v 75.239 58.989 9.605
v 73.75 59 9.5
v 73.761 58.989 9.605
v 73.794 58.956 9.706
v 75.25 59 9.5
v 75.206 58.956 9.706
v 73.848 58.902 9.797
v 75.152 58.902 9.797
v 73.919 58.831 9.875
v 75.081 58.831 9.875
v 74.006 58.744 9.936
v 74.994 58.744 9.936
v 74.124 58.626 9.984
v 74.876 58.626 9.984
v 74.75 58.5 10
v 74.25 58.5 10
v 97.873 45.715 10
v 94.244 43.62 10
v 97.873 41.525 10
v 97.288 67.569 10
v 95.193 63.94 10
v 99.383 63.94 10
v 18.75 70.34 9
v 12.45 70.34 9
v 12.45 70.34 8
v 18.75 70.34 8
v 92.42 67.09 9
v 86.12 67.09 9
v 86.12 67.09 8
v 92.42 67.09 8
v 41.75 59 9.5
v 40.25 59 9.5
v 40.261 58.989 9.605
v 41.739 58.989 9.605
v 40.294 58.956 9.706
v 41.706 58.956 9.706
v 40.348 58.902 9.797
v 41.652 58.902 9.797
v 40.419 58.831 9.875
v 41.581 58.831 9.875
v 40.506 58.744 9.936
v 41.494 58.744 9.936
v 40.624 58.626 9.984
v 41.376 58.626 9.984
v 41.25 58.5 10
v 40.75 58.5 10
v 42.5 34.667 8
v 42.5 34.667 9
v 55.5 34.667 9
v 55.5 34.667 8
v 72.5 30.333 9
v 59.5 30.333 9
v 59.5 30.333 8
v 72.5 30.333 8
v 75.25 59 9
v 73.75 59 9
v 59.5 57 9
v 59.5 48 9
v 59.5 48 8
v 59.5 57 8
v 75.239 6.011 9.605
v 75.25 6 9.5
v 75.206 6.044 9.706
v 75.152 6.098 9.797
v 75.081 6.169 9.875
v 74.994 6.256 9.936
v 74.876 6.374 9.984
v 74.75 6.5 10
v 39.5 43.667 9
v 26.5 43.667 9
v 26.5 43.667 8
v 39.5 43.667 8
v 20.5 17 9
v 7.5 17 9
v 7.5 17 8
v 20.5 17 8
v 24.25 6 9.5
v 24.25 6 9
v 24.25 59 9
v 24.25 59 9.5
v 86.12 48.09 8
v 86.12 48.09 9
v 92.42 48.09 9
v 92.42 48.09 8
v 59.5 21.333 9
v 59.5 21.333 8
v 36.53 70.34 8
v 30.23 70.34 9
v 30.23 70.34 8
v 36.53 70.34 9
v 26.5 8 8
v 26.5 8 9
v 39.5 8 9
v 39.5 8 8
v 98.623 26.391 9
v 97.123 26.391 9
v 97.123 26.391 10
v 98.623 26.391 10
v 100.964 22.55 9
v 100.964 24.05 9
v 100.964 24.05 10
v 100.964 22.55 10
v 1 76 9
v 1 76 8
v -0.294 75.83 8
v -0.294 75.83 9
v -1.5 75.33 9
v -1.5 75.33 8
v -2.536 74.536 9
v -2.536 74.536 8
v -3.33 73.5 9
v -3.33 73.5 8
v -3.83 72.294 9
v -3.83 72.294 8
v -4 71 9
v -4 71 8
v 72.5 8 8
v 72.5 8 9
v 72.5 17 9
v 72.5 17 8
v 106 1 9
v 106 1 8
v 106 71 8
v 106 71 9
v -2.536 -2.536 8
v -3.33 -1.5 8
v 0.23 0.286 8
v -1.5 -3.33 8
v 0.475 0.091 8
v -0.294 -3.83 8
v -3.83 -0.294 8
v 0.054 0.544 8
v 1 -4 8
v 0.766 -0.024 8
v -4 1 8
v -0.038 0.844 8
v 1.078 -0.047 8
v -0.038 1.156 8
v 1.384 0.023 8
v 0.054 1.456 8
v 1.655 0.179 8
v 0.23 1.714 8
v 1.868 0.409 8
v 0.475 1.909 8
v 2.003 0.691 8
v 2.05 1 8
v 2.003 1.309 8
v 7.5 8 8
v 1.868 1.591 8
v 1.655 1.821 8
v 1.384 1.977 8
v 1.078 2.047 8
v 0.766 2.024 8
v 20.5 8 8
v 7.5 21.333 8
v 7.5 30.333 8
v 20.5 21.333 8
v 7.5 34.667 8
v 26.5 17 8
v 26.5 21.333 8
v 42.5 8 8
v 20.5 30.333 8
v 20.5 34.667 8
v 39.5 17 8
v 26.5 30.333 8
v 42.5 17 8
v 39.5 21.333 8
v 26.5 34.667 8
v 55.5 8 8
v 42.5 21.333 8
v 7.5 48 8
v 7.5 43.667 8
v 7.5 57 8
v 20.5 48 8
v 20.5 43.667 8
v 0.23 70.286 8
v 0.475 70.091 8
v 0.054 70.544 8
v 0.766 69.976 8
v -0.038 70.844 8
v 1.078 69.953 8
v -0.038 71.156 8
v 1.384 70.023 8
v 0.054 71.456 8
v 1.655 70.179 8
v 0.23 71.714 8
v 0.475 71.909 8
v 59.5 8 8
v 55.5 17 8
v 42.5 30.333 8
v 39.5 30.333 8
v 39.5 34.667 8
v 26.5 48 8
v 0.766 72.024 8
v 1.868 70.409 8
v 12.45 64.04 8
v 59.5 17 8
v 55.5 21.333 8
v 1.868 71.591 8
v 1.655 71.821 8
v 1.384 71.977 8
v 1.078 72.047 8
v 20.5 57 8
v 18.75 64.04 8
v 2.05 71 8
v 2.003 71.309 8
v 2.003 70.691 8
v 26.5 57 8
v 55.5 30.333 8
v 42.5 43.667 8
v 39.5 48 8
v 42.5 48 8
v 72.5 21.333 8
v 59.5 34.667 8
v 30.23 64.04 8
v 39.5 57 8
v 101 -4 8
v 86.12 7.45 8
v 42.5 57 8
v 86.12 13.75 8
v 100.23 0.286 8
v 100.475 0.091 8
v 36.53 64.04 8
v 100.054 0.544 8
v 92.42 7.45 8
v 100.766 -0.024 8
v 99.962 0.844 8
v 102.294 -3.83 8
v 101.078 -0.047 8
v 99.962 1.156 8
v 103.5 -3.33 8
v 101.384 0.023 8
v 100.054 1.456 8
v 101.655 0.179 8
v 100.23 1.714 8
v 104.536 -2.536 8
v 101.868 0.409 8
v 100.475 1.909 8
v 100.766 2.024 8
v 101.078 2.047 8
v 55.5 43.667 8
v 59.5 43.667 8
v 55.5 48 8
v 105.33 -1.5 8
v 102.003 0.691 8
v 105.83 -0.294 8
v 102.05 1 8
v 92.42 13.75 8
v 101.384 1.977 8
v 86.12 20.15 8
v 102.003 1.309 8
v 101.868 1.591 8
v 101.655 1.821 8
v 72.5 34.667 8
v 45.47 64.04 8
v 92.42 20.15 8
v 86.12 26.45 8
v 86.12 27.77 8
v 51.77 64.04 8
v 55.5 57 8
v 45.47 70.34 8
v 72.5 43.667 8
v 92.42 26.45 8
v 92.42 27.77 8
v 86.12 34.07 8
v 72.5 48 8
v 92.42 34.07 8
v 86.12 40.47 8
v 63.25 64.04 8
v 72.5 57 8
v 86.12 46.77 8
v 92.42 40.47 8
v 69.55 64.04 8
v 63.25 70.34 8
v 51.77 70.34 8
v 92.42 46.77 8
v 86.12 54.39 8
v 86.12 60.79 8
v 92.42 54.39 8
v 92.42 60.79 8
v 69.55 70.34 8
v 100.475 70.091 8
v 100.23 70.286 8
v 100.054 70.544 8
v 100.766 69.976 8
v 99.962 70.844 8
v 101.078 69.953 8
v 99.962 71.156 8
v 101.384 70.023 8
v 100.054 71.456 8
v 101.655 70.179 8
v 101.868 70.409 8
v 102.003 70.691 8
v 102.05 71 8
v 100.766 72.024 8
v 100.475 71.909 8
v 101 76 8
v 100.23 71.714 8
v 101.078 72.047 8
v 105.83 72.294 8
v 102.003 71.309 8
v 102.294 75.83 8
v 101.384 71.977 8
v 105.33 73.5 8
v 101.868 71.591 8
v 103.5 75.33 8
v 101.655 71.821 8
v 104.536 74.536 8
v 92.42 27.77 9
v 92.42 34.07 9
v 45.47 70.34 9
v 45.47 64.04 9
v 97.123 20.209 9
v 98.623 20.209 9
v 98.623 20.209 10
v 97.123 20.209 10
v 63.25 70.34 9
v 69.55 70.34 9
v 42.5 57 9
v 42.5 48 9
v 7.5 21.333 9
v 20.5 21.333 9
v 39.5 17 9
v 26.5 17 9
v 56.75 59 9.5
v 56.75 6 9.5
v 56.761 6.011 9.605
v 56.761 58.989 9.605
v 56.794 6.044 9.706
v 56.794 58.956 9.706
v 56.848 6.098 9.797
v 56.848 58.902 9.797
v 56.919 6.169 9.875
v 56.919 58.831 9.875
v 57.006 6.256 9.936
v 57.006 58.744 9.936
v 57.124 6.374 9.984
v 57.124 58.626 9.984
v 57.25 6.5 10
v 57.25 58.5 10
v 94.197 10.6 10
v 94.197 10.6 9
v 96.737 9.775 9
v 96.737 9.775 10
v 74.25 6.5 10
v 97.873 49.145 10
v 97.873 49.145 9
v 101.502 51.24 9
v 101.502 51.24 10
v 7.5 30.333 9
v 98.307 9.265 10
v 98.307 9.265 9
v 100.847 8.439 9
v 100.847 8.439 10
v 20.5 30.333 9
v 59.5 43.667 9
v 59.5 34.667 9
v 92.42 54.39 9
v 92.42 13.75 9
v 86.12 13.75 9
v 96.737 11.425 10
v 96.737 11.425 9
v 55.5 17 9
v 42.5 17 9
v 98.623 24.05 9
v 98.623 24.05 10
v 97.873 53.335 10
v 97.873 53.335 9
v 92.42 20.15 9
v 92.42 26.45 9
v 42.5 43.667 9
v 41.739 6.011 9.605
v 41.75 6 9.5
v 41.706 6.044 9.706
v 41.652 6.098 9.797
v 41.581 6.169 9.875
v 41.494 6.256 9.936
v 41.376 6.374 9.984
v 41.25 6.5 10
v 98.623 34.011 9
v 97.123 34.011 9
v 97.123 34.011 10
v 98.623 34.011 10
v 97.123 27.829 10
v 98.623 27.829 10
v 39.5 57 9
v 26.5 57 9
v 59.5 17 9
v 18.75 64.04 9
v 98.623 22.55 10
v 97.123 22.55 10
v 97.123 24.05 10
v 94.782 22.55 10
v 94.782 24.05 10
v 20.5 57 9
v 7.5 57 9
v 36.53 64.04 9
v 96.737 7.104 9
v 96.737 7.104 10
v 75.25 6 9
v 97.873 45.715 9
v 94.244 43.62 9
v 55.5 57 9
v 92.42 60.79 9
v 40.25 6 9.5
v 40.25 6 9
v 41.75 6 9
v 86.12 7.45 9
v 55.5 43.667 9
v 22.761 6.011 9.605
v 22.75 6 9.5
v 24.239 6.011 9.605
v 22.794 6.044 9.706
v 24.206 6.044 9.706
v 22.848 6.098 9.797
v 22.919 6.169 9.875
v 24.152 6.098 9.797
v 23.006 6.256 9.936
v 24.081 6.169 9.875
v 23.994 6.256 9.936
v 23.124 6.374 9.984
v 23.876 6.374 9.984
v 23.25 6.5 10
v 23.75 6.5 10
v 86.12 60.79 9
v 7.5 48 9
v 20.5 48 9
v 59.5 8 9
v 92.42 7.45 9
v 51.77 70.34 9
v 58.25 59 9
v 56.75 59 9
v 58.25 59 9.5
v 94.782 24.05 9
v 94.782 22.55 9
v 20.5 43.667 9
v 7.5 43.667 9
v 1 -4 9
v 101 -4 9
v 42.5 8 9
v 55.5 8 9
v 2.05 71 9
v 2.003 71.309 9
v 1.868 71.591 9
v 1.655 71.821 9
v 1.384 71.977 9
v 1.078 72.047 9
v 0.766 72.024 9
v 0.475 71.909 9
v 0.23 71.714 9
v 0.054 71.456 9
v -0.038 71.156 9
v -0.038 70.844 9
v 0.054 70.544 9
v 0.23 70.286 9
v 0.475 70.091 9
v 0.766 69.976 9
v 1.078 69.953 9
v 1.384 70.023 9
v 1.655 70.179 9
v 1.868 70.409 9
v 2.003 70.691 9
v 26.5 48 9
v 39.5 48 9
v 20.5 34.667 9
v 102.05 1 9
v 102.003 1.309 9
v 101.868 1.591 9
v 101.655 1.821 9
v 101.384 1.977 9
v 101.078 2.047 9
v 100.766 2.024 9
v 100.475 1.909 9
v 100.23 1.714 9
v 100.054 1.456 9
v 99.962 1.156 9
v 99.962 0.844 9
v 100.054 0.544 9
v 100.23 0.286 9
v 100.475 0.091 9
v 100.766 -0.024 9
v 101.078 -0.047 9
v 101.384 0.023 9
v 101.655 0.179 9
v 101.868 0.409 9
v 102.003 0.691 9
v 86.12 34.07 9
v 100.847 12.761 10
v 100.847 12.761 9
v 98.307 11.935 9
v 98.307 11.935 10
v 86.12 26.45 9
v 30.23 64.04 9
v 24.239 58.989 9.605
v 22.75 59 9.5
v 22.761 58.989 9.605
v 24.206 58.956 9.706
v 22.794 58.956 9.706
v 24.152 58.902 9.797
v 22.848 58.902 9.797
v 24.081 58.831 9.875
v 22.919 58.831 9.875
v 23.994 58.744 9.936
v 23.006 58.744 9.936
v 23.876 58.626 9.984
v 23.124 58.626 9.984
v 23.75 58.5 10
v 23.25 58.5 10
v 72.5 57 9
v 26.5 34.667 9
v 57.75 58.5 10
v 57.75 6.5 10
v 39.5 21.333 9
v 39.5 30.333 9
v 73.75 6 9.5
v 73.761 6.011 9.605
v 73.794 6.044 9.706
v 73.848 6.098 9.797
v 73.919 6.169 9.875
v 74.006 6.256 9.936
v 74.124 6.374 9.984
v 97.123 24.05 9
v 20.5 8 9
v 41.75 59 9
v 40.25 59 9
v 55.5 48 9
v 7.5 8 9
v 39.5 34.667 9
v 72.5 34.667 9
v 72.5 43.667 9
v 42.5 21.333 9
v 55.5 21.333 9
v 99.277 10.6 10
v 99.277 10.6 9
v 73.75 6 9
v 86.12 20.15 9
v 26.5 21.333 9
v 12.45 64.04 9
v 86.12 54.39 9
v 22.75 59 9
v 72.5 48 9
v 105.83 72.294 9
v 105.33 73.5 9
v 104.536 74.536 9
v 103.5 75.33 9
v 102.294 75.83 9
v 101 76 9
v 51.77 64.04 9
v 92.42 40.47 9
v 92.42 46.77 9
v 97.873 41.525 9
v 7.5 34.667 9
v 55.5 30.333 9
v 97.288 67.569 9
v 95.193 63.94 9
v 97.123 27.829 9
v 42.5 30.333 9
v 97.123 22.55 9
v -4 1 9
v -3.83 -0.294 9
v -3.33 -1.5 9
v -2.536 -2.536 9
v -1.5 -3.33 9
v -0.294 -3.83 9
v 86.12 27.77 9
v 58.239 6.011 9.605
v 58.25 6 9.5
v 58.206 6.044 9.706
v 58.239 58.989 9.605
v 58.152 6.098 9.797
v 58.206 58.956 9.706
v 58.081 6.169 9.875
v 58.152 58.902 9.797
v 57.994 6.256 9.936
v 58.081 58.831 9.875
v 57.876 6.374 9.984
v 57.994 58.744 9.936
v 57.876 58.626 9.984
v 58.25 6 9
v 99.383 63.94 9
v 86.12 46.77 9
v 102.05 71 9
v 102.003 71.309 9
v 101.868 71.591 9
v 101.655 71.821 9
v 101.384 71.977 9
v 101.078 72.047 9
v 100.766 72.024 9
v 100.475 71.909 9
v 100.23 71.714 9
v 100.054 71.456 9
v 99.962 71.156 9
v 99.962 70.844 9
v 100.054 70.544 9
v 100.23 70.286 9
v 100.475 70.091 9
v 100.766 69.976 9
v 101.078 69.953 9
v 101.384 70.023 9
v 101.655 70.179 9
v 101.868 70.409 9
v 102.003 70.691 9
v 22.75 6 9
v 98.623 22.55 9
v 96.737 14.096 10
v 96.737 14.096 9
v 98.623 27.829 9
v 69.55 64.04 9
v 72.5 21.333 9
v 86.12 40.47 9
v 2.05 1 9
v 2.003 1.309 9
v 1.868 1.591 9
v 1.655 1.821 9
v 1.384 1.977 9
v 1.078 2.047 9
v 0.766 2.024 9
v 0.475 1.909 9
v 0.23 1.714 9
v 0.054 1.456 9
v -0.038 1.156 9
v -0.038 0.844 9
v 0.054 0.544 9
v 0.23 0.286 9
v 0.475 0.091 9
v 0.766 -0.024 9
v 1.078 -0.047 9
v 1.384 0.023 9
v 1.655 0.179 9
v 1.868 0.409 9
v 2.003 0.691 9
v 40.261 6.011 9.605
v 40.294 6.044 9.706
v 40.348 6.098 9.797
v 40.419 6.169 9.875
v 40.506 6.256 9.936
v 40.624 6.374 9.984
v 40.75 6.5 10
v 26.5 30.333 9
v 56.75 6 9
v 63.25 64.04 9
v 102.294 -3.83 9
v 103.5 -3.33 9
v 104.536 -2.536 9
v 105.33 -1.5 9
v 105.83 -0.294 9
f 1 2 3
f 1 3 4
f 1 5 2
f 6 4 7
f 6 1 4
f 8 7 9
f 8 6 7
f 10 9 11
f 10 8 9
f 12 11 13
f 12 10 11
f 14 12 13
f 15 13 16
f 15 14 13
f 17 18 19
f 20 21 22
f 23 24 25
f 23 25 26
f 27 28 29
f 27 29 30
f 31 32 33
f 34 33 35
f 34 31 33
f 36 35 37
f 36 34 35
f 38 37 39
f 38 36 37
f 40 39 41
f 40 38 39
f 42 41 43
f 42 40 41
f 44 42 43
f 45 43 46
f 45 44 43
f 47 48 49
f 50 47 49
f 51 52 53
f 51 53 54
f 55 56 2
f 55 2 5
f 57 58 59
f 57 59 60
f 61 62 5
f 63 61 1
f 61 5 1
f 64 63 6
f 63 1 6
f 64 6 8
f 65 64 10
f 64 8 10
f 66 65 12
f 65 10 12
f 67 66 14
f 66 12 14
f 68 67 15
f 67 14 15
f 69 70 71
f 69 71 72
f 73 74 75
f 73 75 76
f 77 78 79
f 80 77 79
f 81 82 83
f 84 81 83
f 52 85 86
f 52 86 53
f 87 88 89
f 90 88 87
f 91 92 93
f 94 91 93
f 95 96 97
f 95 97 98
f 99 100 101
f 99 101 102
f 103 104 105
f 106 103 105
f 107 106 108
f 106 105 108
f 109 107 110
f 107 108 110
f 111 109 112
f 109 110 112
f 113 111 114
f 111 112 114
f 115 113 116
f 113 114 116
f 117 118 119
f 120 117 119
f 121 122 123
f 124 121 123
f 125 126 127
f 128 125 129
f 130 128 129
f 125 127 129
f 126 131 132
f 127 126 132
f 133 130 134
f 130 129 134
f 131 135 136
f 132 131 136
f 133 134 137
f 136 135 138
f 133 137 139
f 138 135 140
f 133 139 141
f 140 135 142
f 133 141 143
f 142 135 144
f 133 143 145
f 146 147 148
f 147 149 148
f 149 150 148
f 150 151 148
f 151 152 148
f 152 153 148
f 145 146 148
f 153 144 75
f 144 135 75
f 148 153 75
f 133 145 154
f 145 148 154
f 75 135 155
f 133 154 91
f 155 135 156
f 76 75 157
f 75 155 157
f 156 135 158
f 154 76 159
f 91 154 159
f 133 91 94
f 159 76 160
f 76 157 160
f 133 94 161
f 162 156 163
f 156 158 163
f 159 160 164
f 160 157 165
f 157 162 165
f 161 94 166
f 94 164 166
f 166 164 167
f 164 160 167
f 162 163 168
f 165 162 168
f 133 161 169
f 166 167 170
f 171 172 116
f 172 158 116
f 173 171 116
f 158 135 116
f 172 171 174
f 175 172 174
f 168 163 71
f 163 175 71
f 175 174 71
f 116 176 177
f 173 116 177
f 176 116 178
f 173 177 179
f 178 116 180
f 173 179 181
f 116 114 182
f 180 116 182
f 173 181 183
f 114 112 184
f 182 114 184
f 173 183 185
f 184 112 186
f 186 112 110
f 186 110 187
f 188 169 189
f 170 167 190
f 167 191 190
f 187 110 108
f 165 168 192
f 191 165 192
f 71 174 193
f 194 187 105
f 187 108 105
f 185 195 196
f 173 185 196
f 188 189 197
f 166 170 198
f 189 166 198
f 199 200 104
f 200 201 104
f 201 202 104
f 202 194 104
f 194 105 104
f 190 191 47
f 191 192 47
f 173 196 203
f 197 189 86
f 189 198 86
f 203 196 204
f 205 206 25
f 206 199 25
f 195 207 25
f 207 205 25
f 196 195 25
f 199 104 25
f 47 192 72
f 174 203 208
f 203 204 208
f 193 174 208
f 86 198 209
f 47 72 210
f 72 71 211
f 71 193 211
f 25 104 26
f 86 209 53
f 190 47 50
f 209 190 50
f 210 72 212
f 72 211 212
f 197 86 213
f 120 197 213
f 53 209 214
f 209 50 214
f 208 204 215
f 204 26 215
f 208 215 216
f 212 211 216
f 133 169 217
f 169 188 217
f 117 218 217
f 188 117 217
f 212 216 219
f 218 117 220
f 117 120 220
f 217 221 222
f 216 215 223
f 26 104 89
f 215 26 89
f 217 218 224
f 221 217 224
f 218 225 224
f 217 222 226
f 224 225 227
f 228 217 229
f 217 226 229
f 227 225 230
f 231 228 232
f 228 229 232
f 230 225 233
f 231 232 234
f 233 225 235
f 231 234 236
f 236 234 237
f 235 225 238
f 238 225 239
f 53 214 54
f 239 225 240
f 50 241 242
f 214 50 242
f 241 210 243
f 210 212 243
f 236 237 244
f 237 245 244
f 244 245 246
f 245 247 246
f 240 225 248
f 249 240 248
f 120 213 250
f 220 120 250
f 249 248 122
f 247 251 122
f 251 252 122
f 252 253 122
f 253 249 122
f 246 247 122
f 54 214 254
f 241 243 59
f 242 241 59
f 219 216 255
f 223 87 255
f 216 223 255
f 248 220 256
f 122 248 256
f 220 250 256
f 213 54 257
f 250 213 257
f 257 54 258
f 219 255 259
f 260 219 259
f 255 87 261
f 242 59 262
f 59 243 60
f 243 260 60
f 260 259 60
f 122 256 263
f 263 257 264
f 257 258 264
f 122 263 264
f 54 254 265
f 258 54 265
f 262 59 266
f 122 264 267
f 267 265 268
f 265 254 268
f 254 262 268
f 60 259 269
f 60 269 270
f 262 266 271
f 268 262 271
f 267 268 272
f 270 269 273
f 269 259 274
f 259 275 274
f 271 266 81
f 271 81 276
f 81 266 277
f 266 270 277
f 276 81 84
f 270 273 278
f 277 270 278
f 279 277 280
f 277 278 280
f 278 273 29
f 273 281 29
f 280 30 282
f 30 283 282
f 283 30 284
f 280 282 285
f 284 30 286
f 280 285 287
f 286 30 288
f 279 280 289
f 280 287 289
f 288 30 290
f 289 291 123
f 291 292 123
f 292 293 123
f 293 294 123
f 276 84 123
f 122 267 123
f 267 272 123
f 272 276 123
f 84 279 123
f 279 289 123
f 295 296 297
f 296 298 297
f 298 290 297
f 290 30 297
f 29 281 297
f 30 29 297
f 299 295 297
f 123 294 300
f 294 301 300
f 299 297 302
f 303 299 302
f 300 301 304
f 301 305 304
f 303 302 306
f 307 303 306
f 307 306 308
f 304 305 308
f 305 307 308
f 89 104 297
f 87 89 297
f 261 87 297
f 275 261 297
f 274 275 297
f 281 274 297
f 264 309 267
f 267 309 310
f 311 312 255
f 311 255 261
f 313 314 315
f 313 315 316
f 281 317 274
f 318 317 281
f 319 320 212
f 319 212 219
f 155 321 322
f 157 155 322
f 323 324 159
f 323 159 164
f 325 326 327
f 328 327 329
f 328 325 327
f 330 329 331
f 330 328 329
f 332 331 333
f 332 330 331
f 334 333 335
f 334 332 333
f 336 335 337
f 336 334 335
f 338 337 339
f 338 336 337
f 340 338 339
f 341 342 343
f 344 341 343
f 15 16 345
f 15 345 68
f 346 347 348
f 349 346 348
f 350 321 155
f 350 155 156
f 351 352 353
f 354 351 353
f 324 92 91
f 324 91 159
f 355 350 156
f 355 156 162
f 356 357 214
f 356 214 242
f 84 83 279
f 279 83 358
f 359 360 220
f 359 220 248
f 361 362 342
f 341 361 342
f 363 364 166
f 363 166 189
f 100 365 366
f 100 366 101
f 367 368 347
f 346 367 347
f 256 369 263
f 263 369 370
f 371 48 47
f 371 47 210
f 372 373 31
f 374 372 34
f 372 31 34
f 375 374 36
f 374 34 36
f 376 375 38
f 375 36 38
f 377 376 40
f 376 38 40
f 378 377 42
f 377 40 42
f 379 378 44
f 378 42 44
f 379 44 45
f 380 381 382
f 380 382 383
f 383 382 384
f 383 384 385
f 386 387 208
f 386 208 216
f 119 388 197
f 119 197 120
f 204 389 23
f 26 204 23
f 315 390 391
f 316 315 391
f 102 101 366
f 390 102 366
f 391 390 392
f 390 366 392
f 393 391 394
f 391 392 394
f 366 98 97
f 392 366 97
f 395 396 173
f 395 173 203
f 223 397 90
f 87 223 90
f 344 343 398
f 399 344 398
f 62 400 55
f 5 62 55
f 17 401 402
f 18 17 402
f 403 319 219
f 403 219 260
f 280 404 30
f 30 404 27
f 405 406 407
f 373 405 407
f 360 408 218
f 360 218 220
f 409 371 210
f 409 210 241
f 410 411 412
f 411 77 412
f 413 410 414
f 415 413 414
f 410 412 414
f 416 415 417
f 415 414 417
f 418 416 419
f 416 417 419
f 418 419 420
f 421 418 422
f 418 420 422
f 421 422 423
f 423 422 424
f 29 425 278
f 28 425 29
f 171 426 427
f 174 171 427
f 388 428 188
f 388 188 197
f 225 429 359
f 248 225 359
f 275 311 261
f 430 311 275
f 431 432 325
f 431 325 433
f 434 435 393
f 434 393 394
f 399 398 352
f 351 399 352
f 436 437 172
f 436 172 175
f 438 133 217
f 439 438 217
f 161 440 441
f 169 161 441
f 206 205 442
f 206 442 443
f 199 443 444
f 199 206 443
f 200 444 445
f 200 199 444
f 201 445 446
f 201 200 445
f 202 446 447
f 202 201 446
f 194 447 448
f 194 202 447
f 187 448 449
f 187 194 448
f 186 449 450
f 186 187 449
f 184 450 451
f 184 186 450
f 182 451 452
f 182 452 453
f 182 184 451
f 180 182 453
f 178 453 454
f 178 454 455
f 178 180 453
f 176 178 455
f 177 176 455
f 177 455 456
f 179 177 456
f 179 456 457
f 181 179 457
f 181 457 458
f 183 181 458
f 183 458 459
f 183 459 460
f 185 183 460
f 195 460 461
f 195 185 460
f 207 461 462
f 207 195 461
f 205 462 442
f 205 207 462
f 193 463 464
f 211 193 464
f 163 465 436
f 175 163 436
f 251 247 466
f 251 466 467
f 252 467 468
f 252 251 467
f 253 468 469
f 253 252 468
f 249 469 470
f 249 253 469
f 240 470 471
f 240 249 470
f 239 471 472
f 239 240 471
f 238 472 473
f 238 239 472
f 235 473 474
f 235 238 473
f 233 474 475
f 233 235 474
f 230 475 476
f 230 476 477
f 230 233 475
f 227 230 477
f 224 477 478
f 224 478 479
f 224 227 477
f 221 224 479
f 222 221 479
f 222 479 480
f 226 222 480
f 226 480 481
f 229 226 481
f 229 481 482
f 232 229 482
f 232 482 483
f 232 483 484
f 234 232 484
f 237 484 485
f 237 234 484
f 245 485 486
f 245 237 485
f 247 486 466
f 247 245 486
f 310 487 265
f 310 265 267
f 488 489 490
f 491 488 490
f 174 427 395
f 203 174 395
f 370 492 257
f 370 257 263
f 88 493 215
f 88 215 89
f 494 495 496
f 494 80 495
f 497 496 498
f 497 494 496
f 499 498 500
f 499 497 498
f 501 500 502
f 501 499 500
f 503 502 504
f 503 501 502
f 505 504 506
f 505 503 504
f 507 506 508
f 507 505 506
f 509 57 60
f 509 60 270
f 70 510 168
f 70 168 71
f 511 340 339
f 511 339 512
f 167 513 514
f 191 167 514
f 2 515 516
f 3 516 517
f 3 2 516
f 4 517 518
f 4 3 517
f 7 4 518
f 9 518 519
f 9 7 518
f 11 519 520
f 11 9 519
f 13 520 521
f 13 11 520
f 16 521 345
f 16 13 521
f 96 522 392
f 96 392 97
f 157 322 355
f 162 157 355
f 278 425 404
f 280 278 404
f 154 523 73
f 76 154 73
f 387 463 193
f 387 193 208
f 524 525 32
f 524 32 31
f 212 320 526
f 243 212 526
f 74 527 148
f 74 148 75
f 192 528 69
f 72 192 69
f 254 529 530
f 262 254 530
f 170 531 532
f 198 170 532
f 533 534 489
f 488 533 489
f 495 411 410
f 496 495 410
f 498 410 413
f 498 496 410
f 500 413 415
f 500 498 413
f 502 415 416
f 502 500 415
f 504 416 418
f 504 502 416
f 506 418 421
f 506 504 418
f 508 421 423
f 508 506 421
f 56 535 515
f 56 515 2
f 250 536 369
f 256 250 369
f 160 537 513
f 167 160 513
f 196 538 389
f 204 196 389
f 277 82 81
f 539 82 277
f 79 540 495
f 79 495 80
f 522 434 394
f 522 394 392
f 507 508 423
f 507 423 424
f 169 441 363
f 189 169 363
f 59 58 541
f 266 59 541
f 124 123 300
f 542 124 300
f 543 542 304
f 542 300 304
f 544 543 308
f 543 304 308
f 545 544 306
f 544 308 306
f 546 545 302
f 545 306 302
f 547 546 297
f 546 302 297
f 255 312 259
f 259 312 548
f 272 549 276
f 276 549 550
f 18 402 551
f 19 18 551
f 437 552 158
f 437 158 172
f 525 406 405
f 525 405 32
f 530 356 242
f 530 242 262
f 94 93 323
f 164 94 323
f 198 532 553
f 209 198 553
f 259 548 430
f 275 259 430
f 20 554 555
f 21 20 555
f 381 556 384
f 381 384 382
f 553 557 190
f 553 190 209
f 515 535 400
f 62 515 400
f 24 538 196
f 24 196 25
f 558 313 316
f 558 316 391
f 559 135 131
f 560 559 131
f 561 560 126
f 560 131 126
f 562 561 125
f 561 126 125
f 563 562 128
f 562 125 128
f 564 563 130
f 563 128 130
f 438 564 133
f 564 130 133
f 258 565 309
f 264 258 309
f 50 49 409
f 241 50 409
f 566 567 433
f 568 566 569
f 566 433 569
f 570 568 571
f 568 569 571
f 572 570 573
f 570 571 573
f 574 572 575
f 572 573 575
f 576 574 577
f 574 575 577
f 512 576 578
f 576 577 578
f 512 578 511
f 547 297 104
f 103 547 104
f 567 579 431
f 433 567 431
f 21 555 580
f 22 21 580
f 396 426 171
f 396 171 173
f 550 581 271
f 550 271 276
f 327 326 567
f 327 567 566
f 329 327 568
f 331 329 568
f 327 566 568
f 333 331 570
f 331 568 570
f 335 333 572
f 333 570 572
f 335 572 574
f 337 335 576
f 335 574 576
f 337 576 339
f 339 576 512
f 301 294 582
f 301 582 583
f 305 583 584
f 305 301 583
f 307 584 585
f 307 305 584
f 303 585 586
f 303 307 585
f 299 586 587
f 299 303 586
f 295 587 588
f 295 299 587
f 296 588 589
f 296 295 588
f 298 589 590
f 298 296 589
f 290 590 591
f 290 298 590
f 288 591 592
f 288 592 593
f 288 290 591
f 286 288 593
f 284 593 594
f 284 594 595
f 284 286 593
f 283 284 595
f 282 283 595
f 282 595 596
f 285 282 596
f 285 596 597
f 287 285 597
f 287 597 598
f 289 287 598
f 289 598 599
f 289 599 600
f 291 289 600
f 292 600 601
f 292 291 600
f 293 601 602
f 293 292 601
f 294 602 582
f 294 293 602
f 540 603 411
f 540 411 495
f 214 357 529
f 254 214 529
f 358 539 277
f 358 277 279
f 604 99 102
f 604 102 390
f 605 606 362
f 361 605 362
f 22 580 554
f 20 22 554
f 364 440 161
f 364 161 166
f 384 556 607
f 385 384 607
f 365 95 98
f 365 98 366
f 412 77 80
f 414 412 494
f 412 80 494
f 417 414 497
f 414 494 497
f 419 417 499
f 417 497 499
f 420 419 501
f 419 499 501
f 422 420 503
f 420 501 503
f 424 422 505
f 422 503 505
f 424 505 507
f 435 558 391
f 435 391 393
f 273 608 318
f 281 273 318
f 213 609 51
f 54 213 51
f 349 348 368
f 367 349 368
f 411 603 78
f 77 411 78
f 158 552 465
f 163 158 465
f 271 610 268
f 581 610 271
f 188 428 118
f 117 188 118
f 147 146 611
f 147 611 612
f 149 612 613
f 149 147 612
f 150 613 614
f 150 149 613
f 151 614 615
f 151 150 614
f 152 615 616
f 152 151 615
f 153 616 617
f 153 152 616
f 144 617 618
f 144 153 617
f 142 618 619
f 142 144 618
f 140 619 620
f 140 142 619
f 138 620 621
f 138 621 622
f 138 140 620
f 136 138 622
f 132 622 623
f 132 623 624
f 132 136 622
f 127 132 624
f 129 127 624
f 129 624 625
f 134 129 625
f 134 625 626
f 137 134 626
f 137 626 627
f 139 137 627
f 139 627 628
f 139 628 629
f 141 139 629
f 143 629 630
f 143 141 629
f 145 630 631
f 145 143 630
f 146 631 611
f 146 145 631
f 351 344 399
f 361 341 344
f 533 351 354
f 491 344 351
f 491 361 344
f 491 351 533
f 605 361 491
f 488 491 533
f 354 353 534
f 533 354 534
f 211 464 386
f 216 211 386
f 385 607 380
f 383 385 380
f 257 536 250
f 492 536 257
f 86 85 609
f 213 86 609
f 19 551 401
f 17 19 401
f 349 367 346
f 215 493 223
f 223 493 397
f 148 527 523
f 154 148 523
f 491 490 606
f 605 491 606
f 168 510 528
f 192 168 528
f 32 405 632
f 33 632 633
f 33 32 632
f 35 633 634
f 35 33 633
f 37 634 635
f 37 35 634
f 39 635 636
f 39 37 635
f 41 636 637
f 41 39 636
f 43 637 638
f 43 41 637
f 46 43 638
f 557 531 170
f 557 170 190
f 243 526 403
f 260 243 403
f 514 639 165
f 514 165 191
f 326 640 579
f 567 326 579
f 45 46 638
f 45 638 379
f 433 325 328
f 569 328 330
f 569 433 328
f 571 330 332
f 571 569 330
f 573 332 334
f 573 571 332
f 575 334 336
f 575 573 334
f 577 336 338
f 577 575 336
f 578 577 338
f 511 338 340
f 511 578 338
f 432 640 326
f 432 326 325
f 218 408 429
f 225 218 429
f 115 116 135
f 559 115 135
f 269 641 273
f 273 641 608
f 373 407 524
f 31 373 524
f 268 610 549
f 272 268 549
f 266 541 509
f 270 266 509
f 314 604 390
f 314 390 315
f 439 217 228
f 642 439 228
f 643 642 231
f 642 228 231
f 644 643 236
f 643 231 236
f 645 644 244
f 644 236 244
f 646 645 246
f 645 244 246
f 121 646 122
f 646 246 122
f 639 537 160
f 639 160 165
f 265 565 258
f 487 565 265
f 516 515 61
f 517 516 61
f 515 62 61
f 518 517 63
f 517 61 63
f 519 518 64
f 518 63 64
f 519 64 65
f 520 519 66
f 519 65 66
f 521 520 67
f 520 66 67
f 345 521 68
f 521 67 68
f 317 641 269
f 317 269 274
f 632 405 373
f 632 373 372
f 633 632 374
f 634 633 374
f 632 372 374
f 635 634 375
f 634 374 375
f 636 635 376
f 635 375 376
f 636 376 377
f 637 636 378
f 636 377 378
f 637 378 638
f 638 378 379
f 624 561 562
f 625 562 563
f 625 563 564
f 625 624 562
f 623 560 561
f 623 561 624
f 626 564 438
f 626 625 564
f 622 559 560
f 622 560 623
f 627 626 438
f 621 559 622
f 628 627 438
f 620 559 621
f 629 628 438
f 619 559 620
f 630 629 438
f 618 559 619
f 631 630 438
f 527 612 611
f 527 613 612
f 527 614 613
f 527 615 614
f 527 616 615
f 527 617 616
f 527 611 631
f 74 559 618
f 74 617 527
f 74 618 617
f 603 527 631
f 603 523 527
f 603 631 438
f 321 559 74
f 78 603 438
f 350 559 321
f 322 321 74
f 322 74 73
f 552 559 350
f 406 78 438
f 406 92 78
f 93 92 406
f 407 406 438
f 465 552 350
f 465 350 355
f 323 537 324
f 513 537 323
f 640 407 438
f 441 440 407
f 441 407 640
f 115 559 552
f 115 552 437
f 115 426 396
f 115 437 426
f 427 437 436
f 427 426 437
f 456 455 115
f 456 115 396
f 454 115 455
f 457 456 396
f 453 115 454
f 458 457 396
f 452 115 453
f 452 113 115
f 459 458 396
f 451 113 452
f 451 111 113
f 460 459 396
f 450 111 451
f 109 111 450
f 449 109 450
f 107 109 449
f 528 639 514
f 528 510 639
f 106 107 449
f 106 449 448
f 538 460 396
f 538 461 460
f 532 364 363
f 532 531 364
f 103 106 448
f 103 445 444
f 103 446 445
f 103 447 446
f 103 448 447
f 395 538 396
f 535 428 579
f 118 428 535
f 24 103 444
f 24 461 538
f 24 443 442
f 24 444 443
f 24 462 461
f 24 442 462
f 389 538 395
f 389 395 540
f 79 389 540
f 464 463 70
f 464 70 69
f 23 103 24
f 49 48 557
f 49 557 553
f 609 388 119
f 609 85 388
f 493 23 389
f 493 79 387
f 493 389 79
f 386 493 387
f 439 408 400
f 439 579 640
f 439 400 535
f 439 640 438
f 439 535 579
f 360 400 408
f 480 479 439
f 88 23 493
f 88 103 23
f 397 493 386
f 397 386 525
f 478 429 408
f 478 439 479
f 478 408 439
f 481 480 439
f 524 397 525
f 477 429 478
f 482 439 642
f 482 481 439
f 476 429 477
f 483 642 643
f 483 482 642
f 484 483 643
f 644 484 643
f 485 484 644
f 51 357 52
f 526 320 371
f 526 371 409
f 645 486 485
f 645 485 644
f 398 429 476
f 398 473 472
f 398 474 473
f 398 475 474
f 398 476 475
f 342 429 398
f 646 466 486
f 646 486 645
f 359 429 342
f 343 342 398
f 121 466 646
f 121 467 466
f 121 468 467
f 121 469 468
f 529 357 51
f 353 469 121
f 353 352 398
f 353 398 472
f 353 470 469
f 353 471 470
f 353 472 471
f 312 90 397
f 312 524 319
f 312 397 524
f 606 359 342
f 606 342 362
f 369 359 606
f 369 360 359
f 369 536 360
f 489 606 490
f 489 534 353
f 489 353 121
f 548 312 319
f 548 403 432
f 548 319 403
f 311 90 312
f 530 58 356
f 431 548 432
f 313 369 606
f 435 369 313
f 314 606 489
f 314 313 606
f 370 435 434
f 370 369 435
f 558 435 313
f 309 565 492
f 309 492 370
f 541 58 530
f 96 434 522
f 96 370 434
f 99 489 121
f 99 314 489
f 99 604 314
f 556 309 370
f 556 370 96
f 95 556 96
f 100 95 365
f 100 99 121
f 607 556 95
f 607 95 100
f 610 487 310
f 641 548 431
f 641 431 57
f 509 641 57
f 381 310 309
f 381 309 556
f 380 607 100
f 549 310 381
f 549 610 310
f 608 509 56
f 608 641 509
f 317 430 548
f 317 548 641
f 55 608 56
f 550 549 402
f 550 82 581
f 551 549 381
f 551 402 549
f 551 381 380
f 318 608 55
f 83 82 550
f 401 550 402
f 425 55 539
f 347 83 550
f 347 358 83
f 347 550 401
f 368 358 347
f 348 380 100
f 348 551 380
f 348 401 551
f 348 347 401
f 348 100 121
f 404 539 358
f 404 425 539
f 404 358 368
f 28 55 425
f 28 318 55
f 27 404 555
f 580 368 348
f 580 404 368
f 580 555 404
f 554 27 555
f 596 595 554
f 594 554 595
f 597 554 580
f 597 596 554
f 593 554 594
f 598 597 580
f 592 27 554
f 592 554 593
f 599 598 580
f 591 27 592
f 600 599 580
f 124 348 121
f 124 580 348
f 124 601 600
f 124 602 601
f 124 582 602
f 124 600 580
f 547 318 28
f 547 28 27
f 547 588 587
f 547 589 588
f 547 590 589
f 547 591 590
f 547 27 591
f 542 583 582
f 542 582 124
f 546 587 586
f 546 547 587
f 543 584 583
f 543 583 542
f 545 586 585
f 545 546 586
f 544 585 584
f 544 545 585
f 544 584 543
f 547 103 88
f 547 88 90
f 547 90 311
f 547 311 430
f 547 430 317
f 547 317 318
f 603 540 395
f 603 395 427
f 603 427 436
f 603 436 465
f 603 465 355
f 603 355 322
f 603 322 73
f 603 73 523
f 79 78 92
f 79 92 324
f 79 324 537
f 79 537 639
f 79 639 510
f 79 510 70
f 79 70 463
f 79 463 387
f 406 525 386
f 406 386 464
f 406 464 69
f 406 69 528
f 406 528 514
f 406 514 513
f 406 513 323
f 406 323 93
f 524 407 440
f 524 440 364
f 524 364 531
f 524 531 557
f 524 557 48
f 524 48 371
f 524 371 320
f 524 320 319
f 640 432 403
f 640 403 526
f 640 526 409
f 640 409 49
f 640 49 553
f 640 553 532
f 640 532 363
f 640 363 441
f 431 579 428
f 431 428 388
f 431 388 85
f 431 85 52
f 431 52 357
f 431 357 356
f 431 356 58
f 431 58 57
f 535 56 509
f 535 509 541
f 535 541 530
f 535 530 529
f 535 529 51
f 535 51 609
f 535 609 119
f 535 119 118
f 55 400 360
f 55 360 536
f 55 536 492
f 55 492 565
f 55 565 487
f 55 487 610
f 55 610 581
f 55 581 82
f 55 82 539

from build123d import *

# Parameters (mm, degrees)
SKETCH045_R     = 1.05
PAD031_DEPTH    = 1
SKETCH046_W     = 6.3
SKETCH046_H     = 6.3
POCKET013_DEPTH = 1.001
SKETCH047_W     = 13
SKETCH047_H     = 9
POCKET014_DEPTH = 1.001
SKETCH049_W     = 1.5
SKETCH049_H     = 53
PAD032_DEPTH    = 1
FILLET001_R     = 0.5
FILLET002_R     = 0.5
FILLET003_R     = 0.5
SKETCH048_W     = 1.5
SKETCH048_H     = 6.181126
PAD033_DEPTH    = 1


with BuildPart() as part:
    # Sketch045 → Pad031 (new body)
    with BuildSketch(Plane.XY):
        with BuildLine():
            Line((-4, 71), (-4, 1))
            ThreePointArc((-4, 1), (-2.535534, -2.535534), (1, -4))
            Line((1, -4), (101, -4))
            ThreePointArc((101, -4), (104.535534, -2.535534), (106, 1))
            Line((106, 1), (106, 71))
            ThreePointArc((106, 71), (104.535534, 74.535534), (101, 76))
            Line((101, 76), (1, 76))
            ThreePointArc((1, 76), (-2.535534, 74.535534), (-4, 71))
        make_face()
        with Locations((1, 71)):
            Circle(SKETCH045_R, mode=Mode.SUBTRACT)
        with Locations((1, 1)):
            Circle(SKETCH045_R, mode=Mode.SUBTRACT)
        with Locations((101, 1)):
            Circle(SKETCH045_R, mode=Mode.SUBTRACT)
        with Locations((101, 71)):
            Circle(SKETCH045_R, mode=Mode.SUBTRACT)
    extrude(amount=PAD031_DEPTH)

    # Sketch046 (on Face14 of Pad031) → Pocket013 (cut, through all)
    with BuildSketch(Plane.XY.offset(1)):
        with Locations((89.27, 63.94)):
            Rectangle(SKETCH046_W, SKETCH046_H)
        with Locations((89.27, 51.24)):
            Rectangle(SKETCH046_W, SKETCH046_H)
        with Locations((89.27, 43.62)):
            Rectangle(SKETCH046_W, SKETCH046_H)
        with Locations((89.27, 30.92)):
            Rectangle(SKETCH046_W, SKETCH046_H)
        with Locations((89.27, 23.3)):
            Rectangle(SKETCH046_W, SKETCH046_H)
        with Locations((89.27, 10.6)):
            Rectangle(SKETCH046_W, SKETCH046_H)
        with Locations((15.6, 67.19)):
            Rectangle(SKETCH046_W, SKETCH046_H)
        with Locations((33.38, 67.19)):
            Rectangle(SKETCH046_W, SKETCH046_H)
        with Locations((48.62, 67.19)):
            Rectangle(SKETCH046_W, SKETCH046_H)
        with Locations((66.4, 67.19)):
            Rectangle(SKETCH046_W, SKETCH046_H)
    extrude(amount=-POCKET013_DEPTH, mode=Mode.SUBTRACT)

    # Sketch047 (on Face5 of Pocket013) → Pocket014 (cut, through all)
    with BuildSketch(Plane.XY.offset(1)):
        with Locations((14, 52.5)):
            Rectangle(SKETCH047_W, SKETCH047_H)
        with Locations((14, 39.166667)):
            Rectangle(SKETCH047_W, SKETCH047_H)
        with Locations((14, 25.833333)):
            Rectangle(SKETCH047_W, SKETCH047_H)
        with Locations((14, 12.5)):
            Rectangle(SKETCH047_W, SKETCH047_H)
        with Locations((33, 39.166667)):
            Rectangle(SKETCH047_W, SKETCH047_H)
        with Locations((33, 25.833333)):
            Rectangle(SKETCH047_W, SKETCH047_H)
        with Locations((33, 12.5)):
            Rectangle(SKETCH047_W, SKETCH047_H)
        with Locations((49, 39.166667)):
            Rectangle(SKETCH047_W, SKETCH047_H)
        with Locations((49, 25.833333)):
            Rectangle(SKETCH047_W, SKETCH047_H)
        with Locations((49, 12.5)):
            Rectangle(SKETCH047_W, SKETCH047_H)
        with Locations((66, 39.166667)):
            Rectangle(SKETCH047_W, SKETCH047_H)
        with Locations((66, 25.833333)):
            Rectangle(SKETCH047_W, SKETCH047_H)
        with Locations((66, 12.5)):
            Rectangle(SKETCH047_W, SKETCH047_H)
        with Locations((33, 52.5)):
            Rectangle(SKETCH047_W, SKETCH047_H)
        with Locations((49, 52.5)):
            Rectangle(SKETCH047_W, SKETCH047_H)
        with Locations((66, 52.5)):
            Rectangle(SKETCH047_W, SKETCH047_H)
    extrude(amount=-POCKET014_DEPTH, mode=Mode.SUBTRACT)

    # Sketch049 (on Face5 of Pocket014) → Pad032 (join)
    with BuildSketch(Plane.XY.offset(1)):
        with Locations((23.5, 32.5)):
            Rectangle(SKETCH049_W, SKETCH049_H)
        with Locations((41, 32.5)):
            Rectangle(SKETCH049_W, SKETCH049_H)
        with Locations((57.5, 32.5)):
            Rectangle(SKETCH049_W, SKETCH049_H)
        with Locations((74.5, 32.5)):
            Rectangle(SKETCH049_W, SKETCH049_H)
    extrude(amount=PAD032_DEPTH)

    # Fillet001
    fillet001_edges = [part.edges().sort_by_distance(p)[0] for p in [
        (24.25, 32.5, 2),
        (23.5, 6, 2),
        (22.75, 32.5, 2),
        (23.5, 59, 2),
    ]]
    fillet(fillet001_edges, radius=FILLET001_R)

    # Fillet002
    fillet002_edges = [part.edges().sort_by_distance(p)[0] for p in [
        (41, 59, 2),
        (41.75, 32.5, 2),
        (41, 6, 2),
        (40.25, 32.5, 2),
    ]]
    fillet(fillet002_edges, radius=FILLET002_R)

    # Fillet003
    fillet003_edges = [part.edges().sort_by_distance(p)[0] for p in [
        (57.5, 59, 2),
        (58.25, 32.5, 2),
        (57.5, 6, 2),
        (56.75, 32.5, 2),
        (74.5, 59, 2),
        (75.25, 32.5, 2),
        (74.5, 6, 2),
        (73.75, 32.5, 2),
    ]]
    fillet(fillet003_edges, radius=FILLET003_R)

    # Sketch048 (on Face5 of Pocket014) → Pad033 (join)
    with BuildSketch(Plane.XY.offset(1)):
        Polygon((94.197178, 10.6), (96.737139, 9.774717), (96.737139, 7.104044), (98.306921, 9.264664), (100.846882, 8.43938), (99.2771, 10.6), (100.846882, 12.76062), (98.306921, 11.935336), (96.737139, 14.095956), (96.737139, 11.425283), align=None)
        with Locations((97.873044, 30.92)):
            Rectangle(SKETCH048_W, SKETCH048_H)
        Polygon((97.123044, 26.390563), (98.623044, 26.390563), (98.623044, 24.05), (100.963607, 24.05), (100.963607, 22.55), (98.623044, 22.55), (98.623044, 20.209437), (97.123044, 20.209437), (97.123044, 22.55), (94.782481, 22.55), (94.782481, 24.05), (97.123044, 24.05), align=None)
        Polygon((94.244044, 43.62), (97.873044, 41.524796), (97.873044, 45.715204), align=None)
        Polygon((101.502044, 51.24), (97.873044, 53.335204), (97.873044, 49.144796), align=None)
        Polygon((97.287938, 67.569), (95.192734, 63.94), (99.383142, 63.94), align=None)
    extrude(amount=PAD033_DEPTH)


with BuildPart() as part_1:
    # Body008 placement: moved
    add(part.part.moved(Location((0, 0, 8))))


solid = part_1.part
